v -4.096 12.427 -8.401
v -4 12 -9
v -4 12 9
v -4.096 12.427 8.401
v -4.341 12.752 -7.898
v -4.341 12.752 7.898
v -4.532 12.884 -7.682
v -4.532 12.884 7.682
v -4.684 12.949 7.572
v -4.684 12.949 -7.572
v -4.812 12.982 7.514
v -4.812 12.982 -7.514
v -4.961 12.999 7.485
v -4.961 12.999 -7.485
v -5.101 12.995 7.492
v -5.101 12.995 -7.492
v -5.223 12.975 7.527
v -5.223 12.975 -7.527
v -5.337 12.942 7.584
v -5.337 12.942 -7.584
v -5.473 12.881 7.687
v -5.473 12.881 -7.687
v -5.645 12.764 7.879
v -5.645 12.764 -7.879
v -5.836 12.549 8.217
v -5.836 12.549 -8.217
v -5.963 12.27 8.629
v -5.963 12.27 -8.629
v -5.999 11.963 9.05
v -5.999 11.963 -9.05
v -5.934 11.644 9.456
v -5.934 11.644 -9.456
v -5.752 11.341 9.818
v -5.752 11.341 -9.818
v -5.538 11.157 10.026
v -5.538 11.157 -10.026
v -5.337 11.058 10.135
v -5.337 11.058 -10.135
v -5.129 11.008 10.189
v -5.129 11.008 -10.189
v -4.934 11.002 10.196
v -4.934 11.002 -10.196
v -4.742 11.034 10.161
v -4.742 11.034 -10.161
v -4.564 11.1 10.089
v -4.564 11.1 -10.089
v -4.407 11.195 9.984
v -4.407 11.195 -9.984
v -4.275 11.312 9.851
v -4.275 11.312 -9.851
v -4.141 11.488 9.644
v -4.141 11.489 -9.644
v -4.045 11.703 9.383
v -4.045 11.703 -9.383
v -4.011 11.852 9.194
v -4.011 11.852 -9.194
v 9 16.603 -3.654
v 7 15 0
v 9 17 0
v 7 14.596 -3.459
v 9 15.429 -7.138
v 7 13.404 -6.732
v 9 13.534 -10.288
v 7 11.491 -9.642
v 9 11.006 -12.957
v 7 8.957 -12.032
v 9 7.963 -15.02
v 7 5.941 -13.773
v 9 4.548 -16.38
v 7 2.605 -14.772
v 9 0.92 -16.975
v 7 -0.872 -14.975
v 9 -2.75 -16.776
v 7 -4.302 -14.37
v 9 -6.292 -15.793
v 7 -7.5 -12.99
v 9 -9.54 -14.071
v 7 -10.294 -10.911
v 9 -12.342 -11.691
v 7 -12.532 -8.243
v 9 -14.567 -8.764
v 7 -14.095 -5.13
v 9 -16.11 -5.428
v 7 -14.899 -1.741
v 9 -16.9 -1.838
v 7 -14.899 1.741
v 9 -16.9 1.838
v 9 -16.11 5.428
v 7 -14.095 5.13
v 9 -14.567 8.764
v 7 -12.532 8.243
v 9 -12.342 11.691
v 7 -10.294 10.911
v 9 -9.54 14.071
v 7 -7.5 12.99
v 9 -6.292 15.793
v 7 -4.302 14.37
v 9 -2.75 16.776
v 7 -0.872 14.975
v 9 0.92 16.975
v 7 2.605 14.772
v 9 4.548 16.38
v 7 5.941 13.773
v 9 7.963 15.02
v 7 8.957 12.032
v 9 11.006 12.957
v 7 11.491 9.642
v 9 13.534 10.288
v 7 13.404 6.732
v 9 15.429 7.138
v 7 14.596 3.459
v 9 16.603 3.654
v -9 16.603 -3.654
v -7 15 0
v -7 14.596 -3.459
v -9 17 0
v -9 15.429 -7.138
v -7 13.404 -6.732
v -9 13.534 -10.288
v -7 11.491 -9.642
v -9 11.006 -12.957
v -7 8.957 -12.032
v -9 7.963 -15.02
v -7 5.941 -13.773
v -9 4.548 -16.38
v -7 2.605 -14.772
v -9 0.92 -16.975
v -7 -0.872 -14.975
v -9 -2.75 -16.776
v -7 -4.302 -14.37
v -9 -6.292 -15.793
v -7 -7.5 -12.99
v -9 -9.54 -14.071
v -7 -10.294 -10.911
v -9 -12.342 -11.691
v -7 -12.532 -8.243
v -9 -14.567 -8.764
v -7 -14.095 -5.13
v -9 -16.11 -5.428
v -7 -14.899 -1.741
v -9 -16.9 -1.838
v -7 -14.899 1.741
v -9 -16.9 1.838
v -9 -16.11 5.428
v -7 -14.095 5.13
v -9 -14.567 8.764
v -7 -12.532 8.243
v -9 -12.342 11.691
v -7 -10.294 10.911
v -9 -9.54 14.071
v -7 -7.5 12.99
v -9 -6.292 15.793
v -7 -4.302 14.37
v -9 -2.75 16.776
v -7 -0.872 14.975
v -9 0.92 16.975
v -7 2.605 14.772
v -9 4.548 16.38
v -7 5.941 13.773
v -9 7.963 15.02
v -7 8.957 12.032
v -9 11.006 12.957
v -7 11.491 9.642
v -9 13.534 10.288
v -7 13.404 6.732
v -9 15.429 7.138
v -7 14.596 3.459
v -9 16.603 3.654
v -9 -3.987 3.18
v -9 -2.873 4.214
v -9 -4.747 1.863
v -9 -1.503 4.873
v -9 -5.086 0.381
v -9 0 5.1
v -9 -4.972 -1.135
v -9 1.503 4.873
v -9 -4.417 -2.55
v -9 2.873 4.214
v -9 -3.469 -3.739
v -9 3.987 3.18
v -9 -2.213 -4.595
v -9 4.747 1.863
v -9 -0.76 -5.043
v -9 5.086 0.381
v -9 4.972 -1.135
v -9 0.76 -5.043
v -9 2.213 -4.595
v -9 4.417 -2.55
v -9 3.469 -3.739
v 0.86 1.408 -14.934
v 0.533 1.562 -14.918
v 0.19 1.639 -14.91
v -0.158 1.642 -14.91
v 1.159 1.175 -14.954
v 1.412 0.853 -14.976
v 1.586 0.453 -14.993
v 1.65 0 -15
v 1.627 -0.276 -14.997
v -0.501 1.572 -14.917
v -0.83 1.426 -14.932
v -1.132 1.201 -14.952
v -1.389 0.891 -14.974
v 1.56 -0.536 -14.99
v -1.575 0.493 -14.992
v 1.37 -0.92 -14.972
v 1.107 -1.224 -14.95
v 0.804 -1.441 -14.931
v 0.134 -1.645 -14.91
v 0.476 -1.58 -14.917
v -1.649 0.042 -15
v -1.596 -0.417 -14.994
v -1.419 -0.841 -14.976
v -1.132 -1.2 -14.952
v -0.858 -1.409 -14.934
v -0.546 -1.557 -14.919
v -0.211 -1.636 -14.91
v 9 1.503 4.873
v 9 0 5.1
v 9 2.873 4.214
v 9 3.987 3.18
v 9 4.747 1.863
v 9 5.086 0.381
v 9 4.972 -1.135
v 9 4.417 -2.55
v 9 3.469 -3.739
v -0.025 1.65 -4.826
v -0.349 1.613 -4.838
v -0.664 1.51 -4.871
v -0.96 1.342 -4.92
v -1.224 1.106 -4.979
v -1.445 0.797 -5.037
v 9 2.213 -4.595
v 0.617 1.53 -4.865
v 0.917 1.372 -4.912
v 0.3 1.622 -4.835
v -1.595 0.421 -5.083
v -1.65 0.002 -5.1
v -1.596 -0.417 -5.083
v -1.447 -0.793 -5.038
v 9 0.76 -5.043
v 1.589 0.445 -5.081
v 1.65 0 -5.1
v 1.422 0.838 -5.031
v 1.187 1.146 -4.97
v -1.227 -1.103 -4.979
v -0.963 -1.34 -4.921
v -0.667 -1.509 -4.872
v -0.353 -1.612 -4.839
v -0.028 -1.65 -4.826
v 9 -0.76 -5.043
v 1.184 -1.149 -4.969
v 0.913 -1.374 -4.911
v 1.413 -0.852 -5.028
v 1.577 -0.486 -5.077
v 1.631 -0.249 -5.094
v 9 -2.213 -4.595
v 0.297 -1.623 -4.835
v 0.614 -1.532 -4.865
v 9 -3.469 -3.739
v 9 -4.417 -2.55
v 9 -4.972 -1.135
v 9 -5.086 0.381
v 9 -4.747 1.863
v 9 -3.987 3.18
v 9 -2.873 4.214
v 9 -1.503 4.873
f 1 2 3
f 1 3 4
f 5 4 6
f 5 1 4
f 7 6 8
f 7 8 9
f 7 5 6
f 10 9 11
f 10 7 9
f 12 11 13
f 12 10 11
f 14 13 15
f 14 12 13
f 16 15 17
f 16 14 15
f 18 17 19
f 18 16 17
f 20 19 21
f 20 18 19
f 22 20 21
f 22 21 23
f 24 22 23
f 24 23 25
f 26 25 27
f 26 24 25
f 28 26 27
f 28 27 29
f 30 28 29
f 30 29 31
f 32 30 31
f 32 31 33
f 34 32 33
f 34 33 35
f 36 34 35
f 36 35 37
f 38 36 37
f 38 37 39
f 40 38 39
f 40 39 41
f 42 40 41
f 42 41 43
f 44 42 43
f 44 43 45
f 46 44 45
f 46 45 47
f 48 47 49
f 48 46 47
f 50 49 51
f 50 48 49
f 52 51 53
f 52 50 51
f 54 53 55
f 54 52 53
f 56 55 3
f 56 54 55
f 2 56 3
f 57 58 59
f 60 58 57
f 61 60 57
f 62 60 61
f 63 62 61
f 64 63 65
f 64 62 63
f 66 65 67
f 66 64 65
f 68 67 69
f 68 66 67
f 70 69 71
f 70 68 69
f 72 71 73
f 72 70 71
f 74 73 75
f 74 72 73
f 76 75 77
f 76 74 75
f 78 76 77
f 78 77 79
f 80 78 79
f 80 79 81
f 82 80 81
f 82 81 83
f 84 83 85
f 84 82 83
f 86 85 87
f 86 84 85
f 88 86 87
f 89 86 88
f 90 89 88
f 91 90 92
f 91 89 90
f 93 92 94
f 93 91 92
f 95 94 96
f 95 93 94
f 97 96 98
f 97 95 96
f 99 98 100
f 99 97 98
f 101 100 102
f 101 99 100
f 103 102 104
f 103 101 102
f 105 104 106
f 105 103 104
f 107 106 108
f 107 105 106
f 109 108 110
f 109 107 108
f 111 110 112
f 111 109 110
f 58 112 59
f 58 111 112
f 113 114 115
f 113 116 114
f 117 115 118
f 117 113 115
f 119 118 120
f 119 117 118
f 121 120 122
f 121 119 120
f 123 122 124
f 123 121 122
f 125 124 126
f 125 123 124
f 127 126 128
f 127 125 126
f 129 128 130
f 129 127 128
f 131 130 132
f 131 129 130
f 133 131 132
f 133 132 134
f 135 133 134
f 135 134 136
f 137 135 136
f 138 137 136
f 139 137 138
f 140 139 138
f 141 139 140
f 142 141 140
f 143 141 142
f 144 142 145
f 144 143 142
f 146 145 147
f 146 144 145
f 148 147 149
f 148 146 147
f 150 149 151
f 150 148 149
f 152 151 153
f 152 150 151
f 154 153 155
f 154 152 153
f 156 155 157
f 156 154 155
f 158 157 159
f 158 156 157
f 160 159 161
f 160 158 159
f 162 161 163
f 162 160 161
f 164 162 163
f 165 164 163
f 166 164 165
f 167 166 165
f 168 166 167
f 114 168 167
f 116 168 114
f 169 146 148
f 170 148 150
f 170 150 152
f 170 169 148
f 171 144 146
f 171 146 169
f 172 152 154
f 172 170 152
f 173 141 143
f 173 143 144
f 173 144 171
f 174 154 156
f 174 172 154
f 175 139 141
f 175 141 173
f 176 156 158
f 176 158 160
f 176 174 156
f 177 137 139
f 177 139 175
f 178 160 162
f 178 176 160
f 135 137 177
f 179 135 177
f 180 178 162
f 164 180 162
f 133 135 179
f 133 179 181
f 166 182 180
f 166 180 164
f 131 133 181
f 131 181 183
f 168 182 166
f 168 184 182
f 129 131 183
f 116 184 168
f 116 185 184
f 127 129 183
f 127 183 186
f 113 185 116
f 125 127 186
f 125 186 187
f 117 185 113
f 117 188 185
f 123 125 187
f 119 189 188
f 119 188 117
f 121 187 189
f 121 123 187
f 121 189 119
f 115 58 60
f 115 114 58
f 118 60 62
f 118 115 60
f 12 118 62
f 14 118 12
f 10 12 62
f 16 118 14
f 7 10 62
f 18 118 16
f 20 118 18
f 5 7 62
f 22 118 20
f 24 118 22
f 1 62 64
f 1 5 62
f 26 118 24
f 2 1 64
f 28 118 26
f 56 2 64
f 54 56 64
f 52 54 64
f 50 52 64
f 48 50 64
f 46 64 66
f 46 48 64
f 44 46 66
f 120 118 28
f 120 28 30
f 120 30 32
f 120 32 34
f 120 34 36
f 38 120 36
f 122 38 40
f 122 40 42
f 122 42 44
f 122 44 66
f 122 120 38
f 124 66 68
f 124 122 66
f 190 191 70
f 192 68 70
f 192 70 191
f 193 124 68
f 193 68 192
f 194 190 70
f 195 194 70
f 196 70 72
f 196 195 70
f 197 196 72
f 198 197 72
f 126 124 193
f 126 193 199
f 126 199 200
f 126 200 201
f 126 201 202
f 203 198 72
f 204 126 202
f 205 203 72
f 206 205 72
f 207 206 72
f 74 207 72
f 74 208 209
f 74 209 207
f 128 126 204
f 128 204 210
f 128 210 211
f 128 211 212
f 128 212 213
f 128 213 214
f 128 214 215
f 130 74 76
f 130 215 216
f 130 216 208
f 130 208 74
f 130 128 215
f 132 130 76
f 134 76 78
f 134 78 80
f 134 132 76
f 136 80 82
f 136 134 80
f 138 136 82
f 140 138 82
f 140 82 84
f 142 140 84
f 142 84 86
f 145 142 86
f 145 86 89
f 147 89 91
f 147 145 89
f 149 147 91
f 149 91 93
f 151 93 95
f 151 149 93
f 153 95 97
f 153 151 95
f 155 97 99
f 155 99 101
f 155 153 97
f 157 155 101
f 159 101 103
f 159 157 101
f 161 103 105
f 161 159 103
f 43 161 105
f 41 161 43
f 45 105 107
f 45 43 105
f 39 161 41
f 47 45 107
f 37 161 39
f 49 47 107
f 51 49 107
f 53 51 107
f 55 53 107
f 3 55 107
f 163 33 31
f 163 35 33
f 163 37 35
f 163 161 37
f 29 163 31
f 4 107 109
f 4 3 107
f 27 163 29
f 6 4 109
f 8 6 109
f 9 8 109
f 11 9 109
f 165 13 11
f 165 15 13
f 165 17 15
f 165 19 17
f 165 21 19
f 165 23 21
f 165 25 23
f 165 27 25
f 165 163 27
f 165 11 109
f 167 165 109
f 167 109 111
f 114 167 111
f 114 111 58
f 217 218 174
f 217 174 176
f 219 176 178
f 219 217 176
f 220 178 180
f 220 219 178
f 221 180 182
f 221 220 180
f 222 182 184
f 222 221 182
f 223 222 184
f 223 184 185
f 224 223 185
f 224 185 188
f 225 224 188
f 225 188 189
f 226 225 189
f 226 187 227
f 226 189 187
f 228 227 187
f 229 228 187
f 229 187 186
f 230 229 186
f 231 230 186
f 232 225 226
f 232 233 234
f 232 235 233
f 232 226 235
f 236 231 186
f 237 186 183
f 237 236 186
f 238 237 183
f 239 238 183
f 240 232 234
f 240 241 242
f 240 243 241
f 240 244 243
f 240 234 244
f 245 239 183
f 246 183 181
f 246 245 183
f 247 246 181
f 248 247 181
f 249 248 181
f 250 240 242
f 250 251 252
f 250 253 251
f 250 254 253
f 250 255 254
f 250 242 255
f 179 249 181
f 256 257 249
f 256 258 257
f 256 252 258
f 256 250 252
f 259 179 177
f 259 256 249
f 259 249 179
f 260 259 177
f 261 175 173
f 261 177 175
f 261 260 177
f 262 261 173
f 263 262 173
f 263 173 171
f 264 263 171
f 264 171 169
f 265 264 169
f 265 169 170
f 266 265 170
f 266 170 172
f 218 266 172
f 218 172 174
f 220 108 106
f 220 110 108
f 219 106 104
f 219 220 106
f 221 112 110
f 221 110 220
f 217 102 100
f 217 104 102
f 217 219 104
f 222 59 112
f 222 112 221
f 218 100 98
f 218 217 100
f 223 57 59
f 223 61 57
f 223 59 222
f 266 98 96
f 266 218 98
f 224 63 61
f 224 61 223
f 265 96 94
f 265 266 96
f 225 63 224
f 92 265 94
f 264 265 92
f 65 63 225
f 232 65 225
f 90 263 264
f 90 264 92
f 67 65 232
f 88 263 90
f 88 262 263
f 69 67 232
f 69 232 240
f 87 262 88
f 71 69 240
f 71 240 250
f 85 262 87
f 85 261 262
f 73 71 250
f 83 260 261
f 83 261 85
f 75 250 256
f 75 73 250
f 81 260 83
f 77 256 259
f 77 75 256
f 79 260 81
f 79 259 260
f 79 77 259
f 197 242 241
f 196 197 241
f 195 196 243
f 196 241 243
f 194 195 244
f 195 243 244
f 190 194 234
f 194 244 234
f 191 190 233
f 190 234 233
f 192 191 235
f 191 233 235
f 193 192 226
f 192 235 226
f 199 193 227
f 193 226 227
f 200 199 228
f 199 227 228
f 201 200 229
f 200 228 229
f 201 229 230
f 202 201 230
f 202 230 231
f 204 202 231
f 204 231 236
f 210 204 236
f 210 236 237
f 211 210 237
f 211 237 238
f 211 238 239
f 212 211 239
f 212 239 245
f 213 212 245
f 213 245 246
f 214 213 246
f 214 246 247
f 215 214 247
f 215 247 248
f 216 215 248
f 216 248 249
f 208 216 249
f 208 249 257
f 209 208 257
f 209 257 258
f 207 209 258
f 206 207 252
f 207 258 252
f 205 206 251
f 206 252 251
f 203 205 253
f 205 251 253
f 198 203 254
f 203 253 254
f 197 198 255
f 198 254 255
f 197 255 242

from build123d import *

# Parameters (mm, degrees)
ENL_V_MAT_EXTRU_1_DEPTH      = 31.033314835
ENL_V_MAT_EXTRU_1_DEPTH_BACK = 31.033314835
ESQUISSE2_R                  = 5.1
ENL_V_MAT_EXTRU_2_DEPTH      = 26.670995306
ENL_V_MAT_EXTRU_2_DEPTH_BACK = 26.670995306
ESQUISSE3_R                  = 1
ESQUISSE4_R                  = 1.65
ENL_V_MAT_EXTRU_3_DEPTH      = 26.670995306


with BuildPart() as part:
    # Esquisse1 → Révolution1 (revolve)
    with BuildSketch(Plane.XY):
        Polygon((9, 0), (9, 17), (7, 15), (-7, 15), (-9, 17), (-9, 0), align=None)
    revolve(axis=Axis((9, 0, 0), (-1, 0, 0)))

    # Esquisse2 → Enlèv. mat.-Extru.1 (cut, two sides: drawn at the far end of the back side and taken through both)
    with BuildSketch(Plane.ZY.offset(9).offset(-ENL_V_MAT_EXTRU_1_DEPTH_BACK)):
        Circle(ESQUISSE2_R)
    extrude(amount=ENL_V_MAT_EXTRU_1_DEPTH + ENL_V_MAT_EXTRU_1_DEPTH_BACK, mode=Mode.SUBTRACT)

    # Esquisse3 → Enlèv. mat.-Extru.2 (cut, two sides: drawn at the far end of the back side and taken through both)
    with BuildSketch(Plane.XY.offset(-ENL_V_MAT_EXTRU_2_DEPTH_BACK)):
        with Locations((-5, 12)):
            Circle(ESQUISSE3_R)
    extrude(amount=ENL_V_MAT_EXTRU_2_DEPTH + ENL_V_MAT_EXTRU_2_DEPTH_BACK, mode=Mode.SUBTRACT)

    # Esquisse4 → Enlèv. mat.-Extru.3 (cut, through all)
    with BuildSketch(Plane.XY):
        Circle(ESQUISSE4_R)
    extrude(amount=-ENL_V_MAT_EXTRU_3_DEPTH, mode=Mode.SUBTRACT)


solid = part.part
